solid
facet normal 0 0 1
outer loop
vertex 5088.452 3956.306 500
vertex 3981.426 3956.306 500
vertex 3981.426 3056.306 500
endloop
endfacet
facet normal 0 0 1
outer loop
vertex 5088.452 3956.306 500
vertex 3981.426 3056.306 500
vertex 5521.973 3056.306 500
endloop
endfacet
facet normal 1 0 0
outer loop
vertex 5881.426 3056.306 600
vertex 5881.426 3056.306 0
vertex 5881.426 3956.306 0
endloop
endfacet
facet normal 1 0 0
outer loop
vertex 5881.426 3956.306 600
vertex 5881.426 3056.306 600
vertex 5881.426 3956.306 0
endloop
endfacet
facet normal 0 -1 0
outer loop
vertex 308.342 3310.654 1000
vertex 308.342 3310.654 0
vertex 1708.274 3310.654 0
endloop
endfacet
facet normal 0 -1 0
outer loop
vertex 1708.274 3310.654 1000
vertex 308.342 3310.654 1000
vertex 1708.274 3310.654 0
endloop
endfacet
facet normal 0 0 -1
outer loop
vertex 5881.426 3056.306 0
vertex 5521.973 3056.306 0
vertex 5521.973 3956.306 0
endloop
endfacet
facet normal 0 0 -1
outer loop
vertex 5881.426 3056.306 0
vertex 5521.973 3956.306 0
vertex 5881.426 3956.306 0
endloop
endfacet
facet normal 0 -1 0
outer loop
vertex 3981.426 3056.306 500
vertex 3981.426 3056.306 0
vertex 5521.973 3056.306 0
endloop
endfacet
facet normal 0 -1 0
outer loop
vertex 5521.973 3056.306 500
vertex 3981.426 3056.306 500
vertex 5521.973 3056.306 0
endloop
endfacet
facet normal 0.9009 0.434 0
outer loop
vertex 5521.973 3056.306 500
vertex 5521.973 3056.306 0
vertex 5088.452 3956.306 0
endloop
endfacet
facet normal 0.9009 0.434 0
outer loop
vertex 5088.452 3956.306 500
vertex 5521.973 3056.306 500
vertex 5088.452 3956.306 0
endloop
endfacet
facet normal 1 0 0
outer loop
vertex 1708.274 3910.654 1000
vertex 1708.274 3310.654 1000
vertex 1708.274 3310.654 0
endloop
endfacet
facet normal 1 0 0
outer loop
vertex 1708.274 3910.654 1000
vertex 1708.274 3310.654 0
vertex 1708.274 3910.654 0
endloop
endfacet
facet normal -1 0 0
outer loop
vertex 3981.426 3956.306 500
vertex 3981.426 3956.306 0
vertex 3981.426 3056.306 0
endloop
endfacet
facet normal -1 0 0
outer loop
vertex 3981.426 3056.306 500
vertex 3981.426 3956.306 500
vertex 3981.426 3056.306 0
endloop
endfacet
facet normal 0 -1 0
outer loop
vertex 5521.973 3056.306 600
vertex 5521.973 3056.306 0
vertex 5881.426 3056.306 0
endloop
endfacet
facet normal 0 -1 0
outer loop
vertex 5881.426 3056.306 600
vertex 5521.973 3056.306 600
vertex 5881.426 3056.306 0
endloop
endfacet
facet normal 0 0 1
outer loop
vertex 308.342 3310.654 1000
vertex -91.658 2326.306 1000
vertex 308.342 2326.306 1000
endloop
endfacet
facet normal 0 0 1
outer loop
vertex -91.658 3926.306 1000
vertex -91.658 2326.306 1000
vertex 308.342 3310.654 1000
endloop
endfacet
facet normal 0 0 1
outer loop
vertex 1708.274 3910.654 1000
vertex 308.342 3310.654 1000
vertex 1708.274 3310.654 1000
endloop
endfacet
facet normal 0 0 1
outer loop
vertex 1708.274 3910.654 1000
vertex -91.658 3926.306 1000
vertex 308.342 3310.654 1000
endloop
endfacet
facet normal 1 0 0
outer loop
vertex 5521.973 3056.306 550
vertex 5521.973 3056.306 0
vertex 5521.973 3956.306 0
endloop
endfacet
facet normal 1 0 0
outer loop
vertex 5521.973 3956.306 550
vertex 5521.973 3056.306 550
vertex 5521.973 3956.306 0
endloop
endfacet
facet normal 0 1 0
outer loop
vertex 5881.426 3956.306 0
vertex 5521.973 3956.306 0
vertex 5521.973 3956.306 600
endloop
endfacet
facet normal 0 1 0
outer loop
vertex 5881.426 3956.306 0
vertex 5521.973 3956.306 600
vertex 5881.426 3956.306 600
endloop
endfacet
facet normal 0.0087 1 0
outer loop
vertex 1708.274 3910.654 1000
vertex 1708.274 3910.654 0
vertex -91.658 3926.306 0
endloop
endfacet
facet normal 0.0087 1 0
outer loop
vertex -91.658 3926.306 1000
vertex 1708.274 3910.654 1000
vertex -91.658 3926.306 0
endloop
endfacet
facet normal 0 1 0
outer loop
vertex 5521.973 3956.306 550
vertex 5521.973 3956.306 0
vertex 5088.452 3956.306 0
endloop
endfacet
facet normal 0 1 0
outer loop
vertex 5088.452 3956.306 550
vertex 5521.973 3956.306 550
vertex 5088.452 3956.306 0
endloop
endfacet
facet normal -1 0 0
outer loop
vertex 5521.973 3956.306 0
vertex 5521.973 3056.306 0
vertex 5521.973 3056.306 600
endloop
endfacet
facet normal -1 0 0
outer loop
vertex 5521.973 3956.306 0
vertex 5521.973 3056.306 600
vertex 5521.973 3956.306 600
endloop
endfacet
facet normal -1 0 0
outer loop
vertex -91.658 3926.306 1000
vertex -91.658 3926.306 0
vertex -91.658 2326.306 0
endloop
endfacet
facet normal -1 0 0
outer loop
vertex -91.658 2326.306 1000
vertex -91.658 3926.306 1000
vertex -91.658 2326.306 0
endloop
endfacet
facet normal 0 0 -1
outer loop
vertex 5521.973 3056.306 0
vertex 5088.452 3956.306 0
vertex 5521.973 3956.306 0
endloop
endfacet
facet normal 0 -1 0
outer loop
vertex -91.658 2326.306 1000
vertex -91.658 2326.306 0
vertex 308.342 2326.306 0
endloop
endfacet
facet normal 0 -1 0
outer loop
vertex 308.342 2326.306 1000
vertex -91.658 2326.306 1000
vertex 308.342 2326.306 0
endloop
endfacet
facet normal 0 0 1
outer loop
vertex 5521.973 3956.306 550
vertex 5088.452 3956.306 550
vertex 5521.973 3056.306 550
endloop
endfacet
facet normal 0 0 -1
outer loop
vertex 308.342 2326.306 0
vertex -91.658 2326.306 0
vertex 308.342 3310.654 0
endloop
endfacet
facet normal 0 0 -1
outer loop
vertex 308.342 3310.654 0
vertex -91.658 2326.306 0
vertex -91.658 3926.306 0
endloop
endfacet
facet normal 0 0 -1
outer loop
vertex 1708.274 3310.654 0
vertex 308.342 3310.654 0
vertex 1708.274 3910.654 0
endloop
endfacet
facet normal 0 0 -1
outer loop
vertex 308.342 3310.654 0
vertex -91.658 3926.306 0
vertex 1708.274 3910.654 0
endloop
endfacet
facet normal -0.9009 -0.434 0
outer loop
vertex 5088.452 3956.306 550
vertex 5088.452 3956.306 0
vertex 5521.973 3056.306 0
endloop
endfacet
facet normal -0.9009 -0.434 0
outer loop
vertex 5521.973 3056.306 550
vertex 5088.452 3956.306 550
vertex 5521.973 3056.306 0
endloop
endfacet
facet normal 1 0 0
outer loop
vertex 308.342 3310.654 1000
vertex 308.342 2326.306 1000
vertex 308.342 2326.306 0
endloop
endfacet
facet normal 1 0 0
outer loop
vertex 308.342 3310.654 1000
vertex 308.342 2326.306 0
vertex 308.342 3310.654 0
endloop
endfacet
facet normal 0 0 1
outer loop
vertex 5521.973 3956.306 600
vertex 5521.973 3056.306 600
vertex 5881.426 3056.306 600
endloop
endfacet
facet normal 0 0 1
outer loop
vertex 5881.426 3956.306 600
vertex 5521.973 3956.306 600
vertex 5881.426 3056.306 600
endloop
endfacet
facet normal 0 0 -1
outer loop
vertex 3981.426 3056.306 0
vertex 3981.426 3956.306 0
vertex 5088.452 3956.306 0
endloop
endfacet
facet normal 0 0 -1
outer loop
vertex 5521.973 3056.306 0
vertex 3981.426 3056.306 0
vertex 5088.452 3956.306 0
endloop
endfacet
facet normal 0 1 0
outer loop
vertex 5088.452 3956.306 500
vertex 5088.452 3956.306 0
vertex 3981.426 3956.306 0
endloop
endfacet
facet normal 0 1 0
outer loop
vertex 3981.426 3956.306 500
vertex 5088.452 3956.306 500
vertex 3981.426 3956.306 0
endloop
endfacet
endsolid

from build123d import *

# Parameters (mm, degrees)
F1_DEPTH = 1000
F2_DEPTH = 500
F0_W     = 359.452391
F0_H     = 900
F3_DEPTH = 600
F4_DEPTH = 550


with BuildPart() as f1:
    # F0 (on Top) → F1 (new body)
    with BuildSketch(Plane.XY):
        Polygon((1708.273513, 3910.653904), (-91.658437, 3926.305628), (-91.658437, 2326.305628), (308.341563, 2326.305628), (308.341563, 3310.653904), (1708.273513, 3310.653904), align=None)
    extrude(amount=F1_DEPTH)


with BuildPart() as f2:
    # F0 (on Top) → F2 (new body)
    with BuildSketch(Plane.XY):
        Polygon((3981.425524, 3956.305647), (3981.425524, 3056.305647), (5521.973133, 3056.305647), (5088.452339, 3956.305647), align=None)
    extrude(amount=F2_DEPTH)


with BuildPart() as f3:
    # F0 (on Top) → F3 (new body)
    with BuildSketch(Plane.XY):
        with Locations((5701.699328, 3506.305647)):
            Rectangle(F0_W, F0_H)
    extrude(amount=F3_DEPTH)


with BuildPart() as f4:
    # F0 (on Top) → F4 (new body)
    with BuildSketch(Plane.XY):
        Polygon((5088.452339, 3956.305647), (5521.973133, 3056.305647), (5521.973133, 3956.305647), align=None)
    extrude(amount=F4_DEPTH)


solid = Compound([f1.part, f2.part, f3.part, f4.part])
